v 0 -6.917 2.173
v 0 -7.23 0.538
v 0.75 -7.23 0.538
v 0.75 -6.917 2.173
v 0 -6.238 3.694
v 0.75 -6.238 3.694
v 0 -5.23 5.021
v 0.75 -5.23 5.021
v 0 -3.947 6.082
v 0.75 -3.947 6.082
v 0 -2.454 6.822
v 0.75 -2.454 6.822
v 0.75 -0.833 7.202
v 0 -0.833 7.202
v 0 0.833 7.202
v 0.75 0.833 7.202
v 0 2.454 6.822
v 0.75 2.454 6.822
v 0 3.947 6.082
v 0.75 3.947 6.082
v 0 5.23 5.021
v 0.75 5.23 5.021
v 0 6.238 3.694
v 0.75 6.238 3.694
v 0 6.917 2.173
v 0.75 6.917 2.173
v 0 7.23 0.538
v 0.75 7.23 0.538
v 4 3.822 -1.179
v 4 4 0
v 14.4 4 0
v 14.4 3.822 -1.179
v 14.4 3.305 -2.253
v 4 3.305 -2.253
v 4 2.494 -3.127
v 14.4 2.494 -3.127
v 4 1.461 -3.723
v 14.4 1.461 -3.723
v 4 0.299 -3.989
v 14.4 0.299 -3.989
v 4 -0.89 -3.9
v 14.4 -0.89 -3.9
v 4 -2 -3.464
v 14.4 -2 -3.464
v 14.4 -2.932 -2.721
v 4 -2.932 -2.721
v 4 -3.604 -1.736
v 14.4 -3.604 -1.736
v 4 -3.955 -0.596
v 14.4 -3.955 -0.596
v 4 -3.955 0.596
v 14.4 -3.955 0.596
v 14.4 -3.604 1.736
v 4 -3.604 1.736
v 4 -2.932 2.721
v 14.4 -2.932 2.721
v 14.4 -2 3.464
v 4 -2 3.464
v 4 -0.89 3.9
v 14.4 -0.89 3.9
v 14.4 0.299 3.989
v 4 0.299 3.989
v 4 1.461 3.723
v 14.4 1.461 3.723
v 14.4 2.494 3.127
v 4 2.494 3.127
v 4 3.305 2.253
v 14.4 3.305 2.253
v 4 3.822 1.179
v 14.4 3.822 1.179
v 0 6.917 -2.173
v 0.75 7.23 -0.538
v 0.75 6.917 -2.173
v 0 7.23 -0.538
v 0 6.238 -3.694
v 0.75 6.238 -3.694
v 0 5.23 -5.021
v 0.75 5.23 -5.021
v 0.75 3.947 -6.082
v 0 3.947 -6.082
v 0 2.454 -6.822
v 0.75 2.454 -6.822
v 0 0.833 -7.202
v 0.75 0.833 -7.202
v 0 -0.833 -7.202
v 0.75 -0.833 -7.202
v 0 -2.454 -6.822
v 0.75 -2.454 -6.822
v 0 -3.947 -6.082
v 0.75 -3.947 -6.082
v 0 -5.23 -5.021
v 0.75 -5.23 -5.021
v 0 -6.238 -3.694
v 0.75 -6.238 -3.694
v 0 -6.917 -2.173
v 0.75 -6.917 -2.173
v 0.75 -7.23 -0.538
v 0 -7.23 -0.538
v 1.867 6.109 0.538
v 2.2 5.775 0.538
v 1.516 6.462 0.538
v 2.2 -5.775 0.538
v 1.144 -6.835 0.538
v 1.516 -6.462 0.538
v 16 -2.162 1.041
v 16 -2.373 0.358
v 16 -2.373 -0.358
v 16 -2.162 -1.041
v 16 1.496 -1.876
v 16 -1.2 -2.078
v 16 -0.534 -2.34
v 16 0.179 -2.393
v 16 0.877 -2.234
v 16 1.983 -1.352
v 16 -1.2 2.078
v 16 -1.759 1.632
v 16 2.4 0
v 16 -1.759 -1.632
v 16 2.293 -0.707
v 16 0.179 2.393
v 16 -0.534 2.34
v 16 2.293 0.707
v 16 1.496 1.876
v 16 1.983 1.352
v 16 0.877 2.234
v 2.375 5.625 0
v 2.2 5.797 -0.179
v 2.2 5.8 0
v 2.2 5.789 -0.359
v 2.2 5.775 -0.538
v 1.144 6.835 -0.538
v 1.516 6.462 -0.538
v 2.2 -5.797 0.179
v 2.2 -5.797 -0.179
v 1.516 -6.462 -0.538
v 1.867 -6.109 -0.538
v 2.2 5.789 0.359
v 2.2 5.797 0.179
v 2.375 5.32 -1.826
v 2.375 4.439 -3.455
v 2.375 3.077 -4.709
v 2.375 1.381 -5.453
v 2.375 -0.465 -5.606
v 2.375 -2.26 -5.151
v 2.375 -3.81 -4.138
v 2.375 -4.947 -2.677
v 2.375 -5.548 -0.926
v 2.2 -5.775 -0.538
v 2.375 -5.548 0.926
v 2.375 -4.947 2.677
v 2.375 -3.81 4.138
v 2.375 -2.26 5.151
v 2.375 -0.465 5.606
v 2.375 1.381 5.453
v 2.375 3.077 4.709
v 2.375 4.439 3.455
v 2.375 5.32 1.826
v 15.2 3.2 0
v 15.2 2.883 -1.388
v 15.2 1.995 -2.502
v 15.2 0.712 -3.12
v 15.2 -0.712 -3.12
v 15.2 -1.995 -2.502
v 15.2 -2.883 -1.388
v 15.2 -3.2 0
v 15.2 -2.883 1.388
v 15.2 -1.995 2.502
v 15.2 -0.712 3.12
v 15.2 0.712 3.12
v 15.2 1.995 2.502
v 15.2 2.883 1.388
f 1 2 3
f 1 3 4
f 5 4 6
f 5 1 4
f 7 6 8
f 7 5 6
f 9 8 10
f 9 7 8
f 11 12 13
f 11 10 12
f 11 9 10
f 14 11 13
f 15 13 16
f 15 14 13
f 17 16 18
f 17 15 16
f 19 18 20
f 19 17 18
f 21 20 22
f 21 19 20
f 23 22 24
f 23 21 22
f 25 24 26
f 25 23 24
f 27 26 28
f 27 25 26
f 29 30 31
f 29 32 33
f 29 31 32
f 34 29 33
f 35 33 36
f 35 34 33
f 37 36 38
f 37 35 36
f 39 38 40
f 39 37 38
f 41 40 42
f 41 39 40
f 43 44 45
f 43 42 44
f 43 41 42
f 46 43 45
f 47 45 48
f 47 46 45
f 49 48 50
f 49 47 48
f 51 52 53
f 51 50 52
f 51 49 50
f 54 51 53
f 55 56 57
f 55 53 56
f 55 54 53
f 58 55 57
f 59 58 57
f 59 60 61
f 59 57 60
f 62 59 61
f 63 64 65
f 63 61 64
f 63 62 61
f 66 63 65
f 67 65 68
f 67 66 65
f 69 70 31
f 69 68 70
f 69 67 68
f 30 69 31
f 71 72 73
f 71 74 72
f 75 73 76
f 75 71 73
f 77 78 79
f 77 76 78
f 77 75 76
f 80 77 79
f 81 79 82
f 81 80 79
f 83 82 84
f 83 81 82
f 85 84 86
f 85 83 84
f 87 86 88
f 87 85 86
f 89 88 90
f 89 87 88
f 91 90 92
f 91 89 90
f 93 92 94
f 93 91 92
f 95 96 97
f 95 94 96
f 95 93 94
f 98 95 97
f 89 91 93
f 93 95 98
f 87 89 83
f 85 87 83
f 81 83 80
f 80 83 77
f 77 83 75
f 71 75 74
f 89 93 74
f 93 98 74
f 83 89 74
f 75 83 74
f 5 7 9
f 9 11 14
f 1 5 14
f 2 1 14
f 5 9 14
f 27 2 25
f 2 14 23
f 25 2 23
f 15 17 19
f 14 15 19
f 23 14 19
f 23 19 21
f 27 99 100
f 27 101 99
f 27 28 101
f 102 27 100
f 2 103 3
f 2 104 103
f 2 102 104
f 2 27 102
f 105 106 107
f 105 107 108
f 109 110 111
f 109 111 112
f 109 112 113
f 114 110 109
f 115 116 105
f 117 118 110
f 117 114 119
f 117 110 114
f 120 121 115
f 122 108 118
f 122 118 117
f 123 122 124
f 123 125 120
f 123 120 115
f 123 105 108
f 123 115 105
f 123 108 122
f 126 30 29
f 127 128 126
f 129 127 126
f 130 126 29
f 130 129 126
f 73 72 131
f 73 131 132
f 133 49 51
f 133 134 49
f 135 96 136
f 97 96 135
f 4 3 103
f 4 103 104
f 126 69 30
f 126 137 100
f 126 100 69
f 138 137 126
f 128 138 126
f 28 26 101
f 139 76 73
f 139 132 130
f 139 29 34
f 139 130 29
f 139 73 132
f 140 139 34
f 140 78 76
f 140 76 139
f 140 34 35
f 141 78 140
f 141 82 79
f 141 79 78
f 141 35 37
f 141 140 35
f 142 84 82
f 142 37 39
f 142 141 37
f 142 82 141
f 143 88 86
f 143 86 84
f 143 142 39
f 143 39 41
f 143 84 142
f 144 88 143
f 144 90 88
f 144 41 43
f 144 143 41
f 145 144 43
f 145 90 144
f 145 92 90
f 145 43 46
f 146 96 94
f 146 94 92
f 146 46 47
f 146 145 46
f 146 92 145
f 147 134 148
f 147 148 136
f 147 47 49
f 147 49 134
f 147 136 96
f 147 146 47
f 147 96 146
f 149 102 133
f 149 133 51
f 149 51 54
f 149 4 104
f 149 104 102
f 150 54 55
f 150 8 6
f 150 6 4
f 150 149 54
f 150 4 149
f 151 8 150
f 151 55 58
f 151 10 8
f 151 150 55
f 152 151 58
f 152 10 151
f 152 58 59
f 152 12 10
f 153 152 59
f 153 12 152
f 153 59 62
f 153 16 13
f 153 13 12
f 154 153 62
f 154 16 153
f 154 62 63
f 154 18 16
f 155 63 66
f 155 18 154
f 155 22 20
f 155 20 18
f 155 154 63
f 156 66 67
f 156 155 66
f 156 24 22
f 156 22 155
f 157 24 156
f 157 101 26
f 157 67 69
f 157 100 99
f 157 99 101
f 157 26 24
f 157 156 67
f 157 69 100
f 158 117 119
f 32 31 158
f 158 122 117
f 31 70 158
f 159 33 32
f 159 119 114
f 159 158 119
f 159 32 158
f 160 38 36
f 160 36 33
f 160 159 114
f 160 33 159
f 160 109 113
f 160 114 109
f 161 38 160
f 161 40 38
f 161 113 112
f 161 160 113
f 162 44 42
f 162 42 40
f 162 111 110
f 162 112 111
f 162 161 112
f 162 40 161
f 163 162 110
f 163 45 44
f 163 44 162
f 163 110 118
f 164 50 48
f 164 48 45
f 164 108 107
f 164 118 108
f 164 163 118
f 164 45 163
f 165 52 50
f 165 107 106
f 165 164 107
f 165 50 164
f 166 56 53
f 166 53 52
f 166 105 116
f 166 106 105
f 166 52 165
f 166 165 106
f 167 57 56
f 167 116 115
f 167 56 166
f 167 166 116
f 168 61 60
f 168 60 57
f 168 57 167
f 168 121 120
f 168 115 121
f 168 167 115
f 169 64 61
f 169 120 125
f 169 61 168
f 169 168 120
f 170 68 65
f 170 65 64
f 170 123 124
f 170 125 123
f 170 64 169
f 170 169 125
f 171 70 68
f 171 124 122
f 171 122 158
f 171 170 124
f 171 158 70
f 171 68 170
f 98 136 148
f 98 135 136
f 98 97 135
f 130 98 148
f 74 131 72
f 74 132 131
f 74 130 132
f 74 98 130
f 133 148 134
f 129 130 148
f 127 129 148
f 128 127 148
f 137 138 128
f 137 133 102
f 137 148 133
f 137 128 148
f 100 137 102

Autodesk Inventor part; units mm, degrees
ref_plane "YZ Plane" through (0, 0, 0) normal (1, 0, 0) x (0, 1, 0)
ref_plane "XZ Plane" through (0, 0, 0) normal (0, 1, 0) x (-1, 0, 0)
sketch "Эскиз1" plane through (0, 0, 0) normal (0, 0, 1) x (1, 0, 0)
  line L0 (0, 0) -> (16, 0)
  line L1 (16, 0) -> (16, 4)
  line L2 (16, 4) -> (5.25, 4)
  line L3 (5.25, 4) -> (4.4832, 4)
  line L4 (4.4832, 4) -> (4, 4)
  line L5 (4, 4) -> (0.75, 7.25)
  line L6 (0.75, 7.25) -> (0, 7.25)
  line L7 (0, 7.25) -> (0, 0)
  line L8 (5.25, 4) -> (4, 4) construction
  line L9 (-3.2, 0) -> (19.2, 0) projected
  line L10 (0, 8.7) -> (0, -1.45) projected
  point P0 (4, 4)
  dimension "d0" = 16
  dimension "d1" = 45
  dimension "d2" = 0.7668
  dimension "d3" = 10.75
  dimension "d4" = 4
  dimension "d5" = 8
  dimension "d6" = 8
  dimension "d7" = 14.5
revolve "Базовый элемент" add sketch "Эскиз1" angle 360 about axis through (0, 0, 0) along (1, 0, 0)
sketch "Эскиз2" plane through (0, 0, 0) normal (-1, 0, 0) x (0, 0, 1)
  line L0 (0.5375, 7.25) -> (0.5375, -7.25)
  line L1 (0.5375, -7.25) -> (-0.5375, -7.25)
  line L2 (-0.5375, -7.25) -> (-0.5375, 7.25)
  line L3 (-0.5375, 7.25) -> (0.5375, 7.25)
  line L4 (-0.5375, 0) -> (0.5375, 0) construction
  line L5 (0, -7.25) -> (0, 7.25) construction
  line L6 (0, 7.25) -> (0, 0) projected
  dimension "d15" = 1.075
  dimension "d16" = 14.5
extrude "Паз" cut sketch "Эскиз2" against normal blind 2.2
thread "Резьба" size "M8x1.25" class "6g" standard "ISO Metric profile" length 12
ref_plane "Work Plane1" through (33.575, 0, 0) normal (0, 0, -1) x (1, 0, 0)
chamfer "Фаска2" distance 1.6 angle 45 1 edges at (16, -4, 0)
equation "\"d0\" = NLG"
equation "\"d2\" = GAL"
equation "\"d3\" = GEL"
equation "\"d5\" = BDM"
equation "\"d6\" = GD"
equation "\"d15\" = SBR"
equation "\"d16\" = KOD"
equation "\"NLG\" = 16"
equation "\"GAL\" = 0.61345 * PTC"
equation "\"GEL\" = 10.75"
equation "\"KOH\" = 4"
equation "\"KOD\" = 14.5"
equation "\"SEWI\" = 90deg"
equation "\"BDM\" = NND"
equation "\"GD\" = NND"
equation "\"SBR\" = 1.075"
equation "\"STI\" = 3.8"
equation "\"SPD\" = NND - 1.2269 * PTC"
equation "\"GUL\" = 0.61345 * PTC"
equation "\"PTC\" = 1.25"
equation "\"EPV\" = 8"
equation "\"THREADDIA\" = 8"
equation "\"TOA\" = 30deg"
equation "\"FAWI\" = 45deg"
equation "\"RR\" = 0.1 * NND"
equation "\"NND\" = 8"
equation "\"GD1\" = THREADDIA - 1.2269 * PTC"
properties part number "Винт M8-6gx16 ГОСТ 17475-80" material "Сталь, мягкая"
